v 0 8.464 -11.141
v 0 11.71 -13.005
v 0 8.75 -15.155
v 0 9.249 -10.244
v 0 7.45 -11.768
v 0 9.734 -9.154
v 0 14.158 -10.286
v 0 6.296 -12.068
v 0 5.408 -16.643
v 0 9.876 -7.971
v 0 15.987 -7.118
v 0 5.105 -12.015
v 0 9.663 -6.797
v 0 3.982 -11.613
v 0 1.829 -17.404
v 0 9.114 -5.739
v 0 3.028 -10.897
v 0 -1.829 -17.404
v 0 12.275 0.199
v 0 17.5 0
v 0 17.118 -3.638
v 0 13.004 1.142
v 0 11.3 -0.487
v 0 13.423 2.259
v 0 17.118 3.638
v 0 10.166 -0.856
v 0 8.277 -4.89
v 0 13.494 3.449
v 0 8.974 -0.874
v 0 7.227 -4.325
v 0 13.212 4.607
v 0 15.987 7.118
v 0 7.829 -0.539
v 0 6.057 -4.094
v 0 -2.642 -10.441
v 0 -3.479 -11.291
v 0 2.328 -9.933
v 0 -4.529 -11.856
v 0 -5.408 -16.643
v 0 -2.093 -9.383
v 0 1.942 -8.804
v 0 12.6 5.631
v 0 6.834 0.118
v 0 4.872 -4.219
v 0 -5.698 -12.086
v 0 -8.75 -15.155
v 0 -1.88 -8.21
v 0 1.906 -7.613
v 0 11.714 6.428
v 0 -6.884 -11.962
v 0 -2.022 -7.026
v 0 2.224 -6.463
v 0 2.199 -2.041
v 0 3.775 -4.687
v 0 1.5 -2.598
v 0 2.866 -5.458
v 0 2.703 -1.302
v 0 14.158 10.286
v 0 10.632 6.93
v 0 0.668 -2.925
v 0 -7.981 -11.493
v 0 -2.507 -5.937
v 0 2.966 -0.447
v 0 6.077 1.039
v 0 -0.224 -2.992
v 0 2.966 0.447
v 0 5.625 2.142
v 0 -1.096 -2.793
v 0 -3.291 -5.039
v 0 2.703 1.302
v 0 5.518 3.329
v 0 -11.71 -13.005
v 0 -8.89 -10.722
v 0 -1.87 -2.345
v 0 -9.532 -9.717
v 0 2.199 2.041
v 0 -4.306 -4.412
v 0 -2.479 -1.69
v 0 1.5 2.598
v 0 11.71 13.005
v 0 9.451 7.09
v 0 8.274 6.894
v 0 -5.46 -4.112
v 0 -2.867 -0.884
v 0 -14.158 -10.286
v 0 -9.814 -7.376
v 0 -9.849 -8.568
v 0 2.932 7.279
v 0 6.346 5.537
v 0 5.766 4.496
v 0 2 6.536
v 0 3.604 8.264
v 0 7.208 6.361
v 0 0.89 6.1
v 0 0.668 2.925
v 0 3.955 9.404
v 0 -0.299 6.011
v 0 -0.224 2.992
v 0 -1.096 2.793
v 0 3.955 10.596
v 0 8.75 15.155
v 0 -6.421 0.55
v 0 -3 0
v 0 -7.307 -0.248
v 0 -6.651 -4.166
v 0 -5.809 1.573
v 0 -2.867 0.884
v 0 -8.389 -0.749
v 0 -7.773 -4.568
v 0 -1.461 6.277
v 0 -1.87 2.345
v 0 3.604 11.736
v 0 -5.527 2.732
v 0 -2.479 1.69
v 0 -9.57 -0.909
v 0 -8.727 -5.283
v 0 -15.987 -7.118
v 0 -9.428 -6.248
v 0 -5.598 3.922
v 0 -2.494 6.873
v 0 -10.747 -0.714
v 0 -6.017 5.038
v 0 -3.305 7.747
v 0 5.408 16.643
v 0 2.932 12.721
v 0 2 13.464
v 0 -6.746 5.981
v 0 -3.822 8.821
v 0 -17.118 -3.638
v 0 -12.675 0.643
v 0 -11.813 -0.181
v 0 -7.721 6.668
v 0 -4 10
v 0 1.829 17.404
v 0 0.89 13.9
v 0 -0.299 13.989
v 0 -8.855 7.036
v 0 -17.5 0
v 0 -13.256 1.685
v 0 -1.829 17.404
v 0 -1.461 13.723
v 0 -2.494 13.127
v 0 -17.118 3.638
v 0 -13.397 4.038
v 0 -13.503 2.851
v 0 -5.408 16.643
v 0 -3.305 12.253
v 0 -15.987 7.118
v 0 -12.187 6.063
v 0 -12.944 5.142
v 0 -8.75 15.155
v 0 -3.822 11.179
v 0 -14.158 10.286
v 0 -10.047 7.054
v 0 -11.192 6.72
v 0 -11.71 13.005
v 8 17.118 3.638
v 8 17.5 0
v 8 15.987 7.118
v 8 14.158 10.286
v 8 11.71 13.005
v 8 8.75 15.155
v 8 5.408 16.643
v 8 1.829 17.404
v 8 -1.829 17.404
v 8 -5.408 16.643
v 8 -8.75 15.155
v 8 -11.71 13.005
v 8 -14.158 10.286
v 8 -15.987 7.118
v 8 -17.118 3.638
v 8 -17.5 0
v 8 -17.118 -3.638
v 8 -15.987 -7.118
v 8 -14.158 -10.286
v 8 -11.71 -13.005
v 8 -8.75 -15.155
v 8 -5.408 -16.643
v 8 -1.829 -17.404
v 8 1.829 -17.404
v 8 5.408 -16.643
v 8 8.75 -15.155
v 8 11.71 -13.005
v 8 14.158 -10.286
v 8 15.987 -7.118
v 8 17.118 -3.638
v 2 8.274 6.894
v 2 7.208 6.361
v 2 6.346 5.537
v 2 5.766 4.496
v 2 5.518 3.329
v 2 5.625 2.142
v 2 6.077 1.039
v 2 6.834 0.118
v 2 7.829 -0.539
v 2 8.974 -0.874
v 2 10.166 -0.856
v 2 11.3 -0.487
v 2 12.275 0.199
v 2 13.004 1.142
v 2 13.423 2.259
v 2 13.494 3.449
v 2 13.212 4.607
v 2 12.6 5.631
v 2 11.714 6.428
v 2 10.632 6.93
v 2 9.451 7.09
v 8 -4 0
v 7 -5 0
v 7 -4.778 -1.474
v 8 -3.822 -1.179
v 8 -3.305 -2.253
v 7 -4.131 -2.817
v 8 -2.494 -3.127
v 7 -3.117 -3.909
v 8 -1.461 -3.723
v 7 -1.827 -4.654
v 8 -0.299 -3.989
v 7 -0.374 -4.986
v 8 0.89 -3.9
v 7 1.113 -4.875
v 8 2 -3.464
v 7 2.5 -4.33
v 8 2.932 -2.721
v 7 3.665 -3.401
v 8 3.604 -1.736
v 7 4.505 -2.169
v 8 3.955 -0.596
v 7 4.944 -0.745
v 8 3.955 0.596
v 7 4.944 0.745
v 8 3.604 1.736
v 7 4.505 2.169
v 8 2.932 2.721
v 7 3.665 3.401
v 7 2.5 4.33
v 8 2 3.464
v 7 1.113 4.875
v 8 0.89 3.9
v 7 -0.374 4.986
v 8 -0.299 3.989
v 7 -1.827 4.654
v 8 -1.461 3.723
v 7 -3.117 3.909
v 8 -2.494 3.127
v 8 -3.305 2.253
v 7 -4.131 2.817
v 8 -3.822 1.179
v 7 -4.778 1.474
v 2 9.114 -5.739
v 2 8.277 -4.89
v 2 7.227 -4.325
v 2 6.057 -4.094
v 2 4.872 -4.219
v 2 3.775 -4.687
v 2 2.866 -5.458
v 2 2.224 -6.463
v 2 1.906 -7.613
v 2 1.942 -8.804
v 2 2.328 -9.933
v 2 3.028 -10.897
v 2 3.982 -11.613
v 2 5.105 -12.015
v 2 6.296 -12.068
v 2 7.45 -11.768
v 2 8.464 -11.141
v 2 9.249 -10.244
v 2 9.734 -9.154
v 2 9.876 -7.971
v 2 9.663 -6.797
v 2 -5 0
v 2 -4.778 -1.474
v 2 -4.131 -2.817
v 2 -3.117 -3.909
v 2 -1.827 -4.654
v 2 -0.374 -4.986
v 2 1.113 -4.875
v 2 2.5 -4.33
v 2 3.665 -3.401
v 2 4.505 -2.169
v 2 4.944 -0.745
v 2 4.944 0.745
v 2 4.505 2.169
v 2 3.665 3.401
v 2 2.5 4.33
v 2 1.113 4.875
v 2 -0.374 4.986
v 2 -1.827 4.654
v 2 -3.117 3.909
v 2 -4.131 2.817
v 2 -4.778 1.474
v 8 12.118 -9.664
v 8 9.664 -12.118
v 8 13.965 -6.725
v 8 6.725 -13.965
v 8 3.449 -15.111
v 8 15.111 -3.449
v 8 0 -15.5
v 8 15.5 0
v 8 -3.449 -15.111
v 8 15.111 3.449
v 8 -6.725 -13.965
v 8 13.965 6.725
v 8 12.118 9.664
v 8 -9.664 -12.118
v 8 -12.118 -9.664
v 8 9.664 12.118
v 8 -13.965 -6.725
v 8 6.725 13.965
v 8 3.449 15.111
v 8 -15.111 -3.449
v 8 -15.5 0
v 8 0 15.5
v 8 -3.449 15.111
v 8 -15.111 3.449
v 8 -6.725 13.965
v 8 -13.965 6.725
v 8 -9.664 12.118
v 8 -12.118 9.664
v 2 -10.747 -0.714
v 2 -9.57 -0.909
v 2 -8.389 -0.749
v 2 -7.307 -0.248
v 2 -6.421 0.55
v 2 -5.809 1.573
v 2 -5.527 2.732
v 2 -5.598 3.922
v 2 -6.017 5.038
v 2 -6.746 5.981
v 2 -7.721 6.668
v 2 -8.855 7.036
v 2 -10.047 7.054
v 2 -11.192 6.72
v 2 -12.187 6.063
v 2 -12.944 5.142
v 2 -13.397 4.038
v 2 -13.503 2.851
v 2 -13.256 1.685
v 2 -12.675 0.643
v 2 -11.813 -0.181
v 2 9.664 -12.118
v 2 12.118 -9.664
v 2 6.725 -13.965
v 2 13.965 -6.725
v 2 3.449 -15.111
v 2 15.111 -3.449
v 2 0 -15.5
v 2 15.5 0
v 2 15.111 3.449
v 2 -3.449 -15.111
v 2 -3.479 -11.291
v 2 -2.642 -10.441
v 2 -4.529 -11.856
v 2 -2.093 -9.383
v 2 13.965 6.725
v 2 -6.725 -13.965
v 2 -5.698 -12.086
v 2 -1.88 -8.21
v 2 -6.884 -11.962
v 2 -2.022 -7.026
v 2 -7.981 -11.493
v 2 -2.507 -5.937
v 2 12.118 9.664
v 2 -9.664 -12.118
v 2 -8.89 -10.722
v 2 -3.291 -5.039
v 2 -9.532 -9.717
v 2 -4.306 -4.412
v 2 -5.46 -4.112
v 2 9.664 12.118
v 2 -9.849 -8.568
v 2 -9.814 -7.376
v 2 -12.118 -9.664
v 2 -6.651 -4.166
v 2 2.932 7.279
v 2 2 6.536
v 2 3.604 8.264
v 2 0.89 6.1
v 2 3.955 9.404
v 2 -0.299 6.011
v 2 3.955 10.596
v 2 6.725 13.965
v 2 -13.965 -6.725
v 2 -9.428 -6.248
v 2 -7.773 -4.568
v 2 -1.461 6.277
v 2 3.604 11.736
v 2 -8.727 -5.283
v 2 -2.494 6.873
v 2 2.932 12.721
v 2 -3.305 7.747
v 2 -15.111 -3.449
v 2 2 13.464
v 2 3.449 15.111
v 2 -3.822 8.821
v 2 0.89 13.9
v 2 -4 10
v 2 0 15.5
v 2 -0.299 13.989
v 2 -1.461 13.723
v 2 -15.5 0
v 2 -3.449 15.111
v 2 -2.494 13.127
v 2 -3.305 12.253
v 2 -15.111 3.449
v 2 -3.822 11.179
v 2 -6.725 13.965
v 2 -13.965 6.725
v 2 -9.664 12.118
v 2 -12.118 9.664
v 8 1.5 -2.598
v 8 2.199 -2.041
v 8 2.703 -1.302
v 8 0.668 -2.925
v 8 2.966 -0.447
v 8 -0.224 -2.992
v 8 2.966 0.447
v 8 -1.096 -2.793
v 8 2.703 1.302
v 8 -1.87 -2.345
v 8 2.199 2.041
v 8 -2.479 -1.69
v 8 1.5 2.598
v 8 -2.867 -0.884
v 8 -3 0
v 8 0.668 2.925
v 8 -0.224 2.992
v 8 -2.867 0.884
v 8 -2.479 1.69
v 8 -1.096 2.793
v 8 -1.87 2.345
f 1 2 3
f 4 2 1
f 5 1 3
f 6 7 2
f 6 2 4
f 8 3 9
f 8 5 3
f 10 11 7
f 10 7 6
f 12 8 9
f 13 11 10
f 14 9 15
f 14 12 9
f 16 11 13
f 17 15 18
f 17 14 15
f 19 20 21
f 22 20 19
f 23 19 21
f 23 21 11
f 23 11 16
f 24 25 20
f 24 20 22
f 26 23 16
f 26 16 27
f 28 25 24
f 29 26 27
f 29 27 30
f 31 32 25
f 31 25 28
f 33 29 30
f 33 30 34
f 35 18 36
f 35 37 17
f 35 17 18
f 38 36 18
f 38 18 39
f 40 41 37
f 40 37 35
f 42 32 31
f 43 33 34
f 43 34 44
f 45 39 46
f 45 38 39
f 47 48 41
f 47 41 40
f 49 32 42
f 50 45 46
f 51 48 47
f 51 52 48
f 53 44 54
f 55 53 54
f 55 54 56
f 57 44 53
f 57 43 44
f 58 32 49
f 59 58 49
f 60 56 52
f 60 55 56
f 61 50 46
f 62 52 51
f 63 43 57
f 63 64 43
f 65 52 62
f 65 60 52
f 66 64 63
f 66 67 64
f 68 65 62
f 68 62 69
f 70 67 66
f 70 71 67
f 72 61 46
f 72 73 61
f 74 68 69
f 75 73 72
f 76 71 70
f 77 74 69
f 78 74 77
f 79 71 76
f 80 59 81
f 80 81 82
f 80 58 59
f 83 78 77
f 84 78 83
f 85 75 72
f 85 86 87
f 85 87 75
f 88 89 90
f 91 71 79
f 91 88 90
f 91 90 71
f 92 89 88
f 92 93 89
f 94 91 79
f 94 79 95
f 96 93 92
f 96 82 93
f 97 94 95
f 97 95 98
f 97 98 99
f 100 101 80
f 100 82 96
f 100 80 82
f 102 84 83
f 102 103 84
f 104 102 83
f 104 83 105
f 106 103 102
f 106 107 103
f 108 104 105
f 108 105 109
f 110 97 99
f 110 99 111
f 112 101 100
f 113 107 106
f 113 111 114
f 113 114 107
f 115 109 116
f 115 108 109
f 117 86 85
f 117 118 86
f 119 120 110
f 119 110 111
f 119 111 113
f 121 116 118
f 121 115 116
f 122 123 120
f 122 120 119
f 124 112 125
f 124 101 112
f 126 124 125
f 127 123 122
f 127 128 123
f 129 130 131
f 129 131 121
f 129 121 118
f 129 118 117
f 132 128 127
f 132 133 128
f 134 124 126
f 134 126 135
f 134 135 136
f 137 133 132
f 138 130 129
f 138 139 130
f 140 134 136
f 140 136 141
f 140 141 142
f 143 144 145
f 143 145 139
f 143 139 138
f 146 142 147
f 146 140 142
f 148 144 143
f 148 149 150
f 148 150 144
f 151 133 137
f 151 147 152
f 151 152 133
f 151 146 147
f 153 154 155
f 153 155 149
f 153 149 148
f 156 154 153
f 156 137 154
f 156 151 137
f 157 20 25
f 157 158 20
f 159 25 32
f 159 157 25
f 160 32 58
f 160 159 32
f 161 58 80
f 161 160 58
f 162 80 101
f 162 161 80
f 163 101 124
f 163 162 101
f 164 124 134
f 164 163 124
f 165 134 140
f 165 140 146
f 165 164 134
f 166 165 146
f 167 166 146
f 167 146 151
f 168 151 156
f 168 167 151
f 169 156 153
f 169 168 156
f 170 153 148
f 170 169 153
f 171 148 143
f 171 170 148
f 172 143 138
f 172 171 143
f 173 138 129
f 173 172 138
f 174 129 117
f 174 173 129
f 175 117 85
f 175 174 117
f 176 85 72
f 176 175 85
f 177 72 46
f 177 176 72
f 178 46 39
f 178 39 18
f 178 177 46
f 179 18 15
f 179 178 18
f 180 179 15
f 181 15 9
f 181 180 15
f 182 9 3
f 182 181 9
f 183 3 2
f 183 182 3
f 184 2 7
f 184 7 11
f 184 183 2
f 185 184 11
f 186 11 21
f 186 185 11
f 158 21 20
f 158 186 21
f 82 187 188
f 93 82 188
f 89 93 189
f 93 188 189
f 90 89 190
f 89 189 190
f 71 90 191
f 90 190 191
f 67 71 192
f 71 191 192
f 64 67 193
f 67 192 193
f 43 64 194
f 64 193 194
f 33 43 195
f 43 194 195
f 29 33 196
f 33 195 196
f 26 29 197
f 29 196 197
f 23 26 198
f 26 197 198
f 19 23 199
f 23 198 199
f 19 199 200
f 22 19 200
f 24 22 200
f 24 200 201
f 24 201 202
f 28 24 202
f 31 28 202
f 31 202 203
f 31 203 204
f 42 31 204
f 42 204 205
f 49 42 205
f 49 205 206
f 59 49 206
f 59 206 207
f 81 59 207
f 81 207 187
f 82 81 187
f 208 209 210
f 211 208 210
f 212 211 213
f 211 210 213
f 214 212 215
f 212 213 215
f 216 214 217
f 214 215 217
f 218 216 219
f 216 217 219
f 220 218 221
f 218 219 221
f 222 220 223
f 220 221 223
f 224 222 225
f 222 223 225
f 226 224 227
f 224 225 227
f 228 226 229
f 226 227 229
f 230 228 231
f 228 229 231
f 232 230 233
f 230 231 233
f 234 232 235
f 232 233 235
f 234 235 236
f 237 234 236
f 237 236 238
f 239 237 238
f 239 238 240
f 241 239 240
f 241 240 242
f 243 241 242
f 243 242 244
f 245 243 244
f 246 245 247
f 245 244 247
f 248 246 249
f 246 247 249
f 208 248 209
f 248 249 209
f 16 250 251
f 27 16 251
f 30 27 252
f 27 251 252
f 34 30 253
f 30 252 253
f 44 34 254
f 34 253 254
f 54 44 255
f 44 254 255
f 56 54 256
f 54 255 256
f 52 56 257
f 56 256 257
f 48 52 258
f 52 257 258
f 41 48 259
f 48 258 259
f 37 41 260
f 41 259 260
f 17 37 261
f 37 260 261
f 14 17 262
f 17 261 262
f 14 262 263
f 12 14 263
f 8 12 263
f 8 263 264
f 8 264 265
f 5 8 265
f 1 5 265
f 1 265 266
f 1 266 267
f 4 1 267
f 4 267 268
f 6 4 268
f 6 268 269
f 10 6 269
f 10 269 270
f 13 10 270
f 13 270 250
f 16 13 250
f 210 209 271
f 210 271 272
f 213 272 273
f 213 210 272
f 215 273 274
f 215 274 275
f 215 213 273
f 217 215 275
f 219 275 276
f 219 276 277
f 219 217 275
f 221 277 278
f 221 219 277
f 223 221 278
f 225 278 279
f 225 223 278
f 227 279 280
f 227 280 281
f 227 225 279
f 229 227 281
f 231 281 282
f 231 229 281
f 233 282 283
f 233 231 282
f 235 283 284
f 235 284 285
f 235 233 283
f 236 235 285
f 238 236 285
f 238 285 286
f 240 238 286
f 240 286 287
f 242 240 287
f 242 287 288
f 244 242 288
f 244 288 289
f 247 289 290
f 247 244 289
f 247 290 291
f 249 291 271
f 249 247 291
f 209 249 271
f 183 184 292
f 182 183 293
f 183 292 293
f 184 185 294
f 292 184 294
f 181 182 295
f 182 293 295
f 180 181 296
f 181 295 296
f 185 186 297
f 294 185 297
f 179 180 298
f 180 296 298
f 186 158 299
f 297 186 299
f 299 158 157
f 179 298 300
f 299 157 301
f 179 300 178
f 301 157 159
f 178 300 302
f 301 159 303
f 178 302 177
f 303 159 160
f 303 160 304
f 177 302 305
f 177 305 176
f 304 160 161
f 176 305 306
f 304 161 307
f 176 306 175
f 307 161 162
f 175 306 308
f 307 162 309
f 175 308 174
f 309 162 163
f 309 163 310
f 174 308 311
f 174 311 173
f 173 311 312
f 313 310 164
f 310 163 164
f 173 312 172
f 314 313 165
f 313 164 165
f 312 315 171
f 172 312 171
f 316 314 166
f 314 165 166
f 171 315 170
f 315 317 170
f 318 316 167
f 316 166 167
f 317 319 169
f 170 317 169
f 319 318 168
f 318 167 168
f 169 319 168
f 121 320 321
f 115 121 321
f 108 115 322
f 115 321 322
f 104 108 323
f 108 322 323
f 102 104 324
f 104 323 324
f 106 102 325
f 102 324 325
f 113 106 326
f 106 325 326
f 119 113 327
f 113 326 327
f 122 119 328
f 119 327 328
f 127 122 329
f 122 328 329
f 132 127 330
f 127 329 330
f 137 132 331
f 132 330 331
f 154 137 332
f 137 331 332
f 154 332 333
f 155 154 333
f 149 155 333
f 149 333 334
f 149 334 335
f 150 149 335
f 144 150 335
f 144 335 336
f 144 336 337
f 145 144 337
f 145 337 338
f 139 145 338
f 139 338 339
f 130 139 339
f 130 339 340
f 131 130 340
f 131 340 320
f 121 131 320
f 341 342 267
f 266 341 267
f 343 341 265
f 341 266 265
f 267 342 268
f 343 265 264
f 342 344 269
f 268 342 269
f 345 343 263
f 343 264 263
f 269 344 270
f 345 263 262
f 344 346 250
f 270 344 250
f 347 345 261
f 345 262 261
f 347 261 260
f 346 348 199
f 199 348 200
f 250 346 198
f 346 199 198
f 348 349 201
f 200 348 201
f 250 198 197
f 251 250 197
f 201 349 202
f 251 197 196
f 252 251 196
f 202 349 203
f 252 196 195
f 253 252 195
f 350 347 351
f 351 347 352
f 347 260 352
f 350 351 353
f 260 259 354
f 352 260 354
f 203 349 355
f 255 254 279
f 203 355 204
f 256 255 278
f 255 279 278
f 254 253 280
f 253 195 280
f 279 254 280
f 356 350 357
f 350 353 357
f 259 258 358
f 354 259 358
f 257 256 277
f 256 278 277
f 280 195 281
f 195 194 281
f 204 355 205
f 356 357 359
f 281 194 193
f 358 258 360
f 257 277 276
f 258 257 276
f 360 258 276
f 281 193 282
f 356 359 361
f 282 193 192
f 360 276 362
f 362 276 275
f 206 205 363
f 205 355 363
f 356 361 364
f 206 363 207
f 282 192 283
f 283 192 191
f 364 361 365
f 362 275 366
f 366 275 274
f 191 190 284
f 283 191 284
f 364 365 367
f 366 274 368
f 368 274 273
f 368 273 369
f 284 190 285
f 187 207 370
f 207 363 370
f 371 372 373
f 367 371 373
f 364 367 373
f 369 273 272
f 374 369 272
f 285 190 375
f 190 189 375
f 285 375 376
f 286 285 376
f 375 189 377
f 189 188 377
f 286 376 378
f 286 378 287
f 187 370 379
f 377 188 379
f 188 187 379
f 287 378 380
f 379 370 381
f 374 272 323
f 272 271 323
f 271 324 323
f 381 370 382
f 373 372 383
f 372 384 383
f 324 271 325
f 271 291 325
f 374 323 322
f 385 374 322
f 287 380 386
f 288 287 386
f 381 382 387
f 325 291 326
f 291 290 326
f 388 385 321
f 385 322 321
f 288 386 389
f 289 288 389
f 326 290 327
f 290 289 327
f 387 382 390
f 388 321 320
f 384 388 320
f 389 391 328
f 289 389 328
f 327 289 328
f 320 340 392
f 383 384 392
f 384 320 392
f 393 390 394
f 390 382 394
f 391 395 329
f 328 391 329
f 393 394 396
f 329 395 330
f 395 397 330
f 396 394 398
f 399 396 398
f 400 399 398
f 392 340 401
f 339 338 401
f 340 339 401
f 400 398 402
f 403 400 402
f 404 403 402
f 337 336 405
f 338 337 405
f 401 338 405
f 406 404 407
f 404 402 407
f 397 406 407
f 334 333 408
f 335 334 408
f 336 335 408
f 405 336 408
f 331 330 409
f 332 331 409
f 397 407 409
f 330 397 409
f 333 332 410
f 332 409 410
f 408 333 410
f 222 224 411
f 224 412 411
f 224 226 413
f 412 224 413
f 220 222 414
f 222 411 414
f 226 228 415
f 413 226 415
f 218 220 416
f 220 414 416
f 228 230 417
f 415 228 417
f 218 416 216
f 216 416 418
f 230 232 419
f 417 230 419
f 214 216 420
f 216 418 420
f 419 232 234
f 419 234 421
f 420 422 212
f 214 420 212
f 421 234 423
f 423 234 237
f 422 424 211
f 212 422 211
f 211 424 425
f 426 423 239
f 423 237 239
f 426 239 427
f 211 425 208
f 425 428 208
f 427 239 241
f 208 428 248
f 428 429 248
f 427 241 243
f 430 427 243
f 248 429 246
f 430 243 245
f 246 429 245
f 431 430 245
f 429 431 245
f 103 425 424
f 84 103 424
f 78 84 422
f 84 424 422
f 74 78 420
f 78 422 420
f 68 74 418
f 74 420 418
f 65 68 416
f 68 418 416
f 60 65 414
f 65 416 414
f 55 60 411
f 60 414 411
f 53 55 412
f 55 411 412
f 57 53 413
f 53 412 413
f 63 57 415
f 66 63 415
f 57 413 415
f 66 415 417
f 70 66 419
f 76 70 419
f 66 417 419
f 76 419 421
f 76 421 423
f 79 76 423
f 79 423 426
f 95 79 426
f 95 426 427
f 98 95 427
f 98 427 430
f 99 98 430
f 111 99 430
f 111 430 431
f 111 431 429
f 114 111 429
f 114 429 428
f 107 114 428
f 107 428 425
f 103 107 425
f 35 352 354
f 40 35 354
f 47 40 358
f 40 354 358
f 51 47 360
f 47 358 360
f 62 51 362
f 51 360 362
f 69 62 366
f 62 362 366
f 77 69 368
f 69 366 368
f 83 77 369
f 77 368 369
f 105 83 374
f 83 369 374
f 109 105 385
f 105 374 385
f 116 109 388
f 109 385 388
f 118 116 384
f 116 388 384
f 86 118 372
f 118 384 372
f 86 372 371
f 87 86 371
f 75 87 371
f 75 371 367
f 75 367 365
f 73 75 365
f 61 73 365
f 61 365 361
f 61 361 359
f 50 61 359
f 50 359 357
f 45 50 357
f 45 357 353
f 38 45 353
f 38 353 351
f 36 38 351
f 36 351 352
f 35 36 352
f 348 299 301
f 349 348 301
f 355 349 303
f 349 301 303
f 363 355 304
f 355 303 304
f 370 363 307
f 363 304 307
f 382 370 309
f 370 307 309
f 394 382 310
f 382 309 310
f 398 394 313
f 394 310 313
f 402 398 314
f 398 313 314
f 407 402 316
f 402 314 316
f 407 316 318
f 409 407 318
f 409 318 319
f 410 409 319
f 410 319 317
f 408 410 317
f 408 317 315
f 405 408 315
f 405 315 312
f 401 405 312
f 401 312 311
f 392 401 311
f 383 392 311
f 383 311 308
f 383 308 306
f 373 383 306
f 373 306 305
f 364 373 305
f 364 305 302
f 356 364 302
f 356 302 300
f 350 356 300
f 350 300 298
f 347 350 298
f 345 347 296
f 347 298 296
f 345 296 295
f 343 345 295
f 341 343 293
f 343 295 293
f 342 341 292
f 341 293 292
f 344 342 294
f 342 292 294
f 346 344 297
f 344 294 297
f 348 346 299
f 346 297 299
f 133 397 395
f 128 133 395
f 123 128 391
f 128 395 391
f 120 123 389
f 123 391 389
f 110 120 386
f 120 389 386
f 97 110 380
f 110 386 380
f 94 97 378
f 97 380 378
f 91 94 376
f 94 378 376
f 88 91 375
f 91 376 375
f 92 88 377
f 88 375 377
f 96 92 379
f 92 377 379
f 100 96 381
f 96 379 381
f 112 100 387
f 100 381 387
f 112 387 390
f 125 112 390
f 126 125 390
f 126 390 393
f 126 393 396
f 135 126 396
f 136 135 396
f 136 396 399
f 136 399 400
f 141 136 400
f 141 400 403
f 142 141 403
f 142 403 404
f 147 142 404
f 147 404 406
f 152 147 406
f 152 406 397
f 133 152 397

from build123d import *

# Parameters (mm, degrees)
F0_W            = 8
F0_H            = 17.5
F3_D            = 6
F4_T            = -2
F6_D            = 8
F6_COPIES_COUNT = 5
F7_SIZE         = 1


# Not quite as in the source:
# - a pattern or mirror of a feature is missing from the dataset's text; its kind, count and spacing are read off the source's solid


with BuildPart() as f1:
    # F0 (on Top) → F1 (revolve)
    with BuildSketch(Plane.XY):
        with Locations((4, 8.75)):
            Rectangle(F0_W, F0_H)
    revolve(axis=Axis((4, 0, 0), (1, 0, 0)))

    # F3 (through all)
    with Locations(Plane(origin=(0, 0, 0), x_dir=(0, 1, 0), z_dir=(-1, 0, 0))):
        with Locations((0, 0)):
            Hole(F3_D / 2)

    # F4
    f4_openings = [f1.faces().sort_by_distance(p)[0] for p in [
        (8, -17.005025, 0),
    ]]
    offset(amount=F4_T, openings=f4_openings)

    # F6 (through all)
    with Locations(Plane(origin=(0, 0, 0), x_dir=(0, 1, 0), z_dir=(-1, 0, 0))):
        with Locations((0, -10)):
            f6 = Hole(F6_D / 2)

    # F6_copies: F6 ×5 about axis
    f6_copies_axis = Axis((0, 0, 0), (1, 0, 0))
    for i in range(1, F6_COPIES_COUNT):
        add(f6.rotate(f6_copies_axis, i * 360 / F6_COPIES_COUNT), mode=Mode.SUBTRACT)

    # F7
    f7_edges = [f1.edges().sort_by_distance(p)[0] for p in [
        (8, -5, 0),
    ]]
    chamfer(f7_edges, length=F7_SIZE)


solid = f1.part
